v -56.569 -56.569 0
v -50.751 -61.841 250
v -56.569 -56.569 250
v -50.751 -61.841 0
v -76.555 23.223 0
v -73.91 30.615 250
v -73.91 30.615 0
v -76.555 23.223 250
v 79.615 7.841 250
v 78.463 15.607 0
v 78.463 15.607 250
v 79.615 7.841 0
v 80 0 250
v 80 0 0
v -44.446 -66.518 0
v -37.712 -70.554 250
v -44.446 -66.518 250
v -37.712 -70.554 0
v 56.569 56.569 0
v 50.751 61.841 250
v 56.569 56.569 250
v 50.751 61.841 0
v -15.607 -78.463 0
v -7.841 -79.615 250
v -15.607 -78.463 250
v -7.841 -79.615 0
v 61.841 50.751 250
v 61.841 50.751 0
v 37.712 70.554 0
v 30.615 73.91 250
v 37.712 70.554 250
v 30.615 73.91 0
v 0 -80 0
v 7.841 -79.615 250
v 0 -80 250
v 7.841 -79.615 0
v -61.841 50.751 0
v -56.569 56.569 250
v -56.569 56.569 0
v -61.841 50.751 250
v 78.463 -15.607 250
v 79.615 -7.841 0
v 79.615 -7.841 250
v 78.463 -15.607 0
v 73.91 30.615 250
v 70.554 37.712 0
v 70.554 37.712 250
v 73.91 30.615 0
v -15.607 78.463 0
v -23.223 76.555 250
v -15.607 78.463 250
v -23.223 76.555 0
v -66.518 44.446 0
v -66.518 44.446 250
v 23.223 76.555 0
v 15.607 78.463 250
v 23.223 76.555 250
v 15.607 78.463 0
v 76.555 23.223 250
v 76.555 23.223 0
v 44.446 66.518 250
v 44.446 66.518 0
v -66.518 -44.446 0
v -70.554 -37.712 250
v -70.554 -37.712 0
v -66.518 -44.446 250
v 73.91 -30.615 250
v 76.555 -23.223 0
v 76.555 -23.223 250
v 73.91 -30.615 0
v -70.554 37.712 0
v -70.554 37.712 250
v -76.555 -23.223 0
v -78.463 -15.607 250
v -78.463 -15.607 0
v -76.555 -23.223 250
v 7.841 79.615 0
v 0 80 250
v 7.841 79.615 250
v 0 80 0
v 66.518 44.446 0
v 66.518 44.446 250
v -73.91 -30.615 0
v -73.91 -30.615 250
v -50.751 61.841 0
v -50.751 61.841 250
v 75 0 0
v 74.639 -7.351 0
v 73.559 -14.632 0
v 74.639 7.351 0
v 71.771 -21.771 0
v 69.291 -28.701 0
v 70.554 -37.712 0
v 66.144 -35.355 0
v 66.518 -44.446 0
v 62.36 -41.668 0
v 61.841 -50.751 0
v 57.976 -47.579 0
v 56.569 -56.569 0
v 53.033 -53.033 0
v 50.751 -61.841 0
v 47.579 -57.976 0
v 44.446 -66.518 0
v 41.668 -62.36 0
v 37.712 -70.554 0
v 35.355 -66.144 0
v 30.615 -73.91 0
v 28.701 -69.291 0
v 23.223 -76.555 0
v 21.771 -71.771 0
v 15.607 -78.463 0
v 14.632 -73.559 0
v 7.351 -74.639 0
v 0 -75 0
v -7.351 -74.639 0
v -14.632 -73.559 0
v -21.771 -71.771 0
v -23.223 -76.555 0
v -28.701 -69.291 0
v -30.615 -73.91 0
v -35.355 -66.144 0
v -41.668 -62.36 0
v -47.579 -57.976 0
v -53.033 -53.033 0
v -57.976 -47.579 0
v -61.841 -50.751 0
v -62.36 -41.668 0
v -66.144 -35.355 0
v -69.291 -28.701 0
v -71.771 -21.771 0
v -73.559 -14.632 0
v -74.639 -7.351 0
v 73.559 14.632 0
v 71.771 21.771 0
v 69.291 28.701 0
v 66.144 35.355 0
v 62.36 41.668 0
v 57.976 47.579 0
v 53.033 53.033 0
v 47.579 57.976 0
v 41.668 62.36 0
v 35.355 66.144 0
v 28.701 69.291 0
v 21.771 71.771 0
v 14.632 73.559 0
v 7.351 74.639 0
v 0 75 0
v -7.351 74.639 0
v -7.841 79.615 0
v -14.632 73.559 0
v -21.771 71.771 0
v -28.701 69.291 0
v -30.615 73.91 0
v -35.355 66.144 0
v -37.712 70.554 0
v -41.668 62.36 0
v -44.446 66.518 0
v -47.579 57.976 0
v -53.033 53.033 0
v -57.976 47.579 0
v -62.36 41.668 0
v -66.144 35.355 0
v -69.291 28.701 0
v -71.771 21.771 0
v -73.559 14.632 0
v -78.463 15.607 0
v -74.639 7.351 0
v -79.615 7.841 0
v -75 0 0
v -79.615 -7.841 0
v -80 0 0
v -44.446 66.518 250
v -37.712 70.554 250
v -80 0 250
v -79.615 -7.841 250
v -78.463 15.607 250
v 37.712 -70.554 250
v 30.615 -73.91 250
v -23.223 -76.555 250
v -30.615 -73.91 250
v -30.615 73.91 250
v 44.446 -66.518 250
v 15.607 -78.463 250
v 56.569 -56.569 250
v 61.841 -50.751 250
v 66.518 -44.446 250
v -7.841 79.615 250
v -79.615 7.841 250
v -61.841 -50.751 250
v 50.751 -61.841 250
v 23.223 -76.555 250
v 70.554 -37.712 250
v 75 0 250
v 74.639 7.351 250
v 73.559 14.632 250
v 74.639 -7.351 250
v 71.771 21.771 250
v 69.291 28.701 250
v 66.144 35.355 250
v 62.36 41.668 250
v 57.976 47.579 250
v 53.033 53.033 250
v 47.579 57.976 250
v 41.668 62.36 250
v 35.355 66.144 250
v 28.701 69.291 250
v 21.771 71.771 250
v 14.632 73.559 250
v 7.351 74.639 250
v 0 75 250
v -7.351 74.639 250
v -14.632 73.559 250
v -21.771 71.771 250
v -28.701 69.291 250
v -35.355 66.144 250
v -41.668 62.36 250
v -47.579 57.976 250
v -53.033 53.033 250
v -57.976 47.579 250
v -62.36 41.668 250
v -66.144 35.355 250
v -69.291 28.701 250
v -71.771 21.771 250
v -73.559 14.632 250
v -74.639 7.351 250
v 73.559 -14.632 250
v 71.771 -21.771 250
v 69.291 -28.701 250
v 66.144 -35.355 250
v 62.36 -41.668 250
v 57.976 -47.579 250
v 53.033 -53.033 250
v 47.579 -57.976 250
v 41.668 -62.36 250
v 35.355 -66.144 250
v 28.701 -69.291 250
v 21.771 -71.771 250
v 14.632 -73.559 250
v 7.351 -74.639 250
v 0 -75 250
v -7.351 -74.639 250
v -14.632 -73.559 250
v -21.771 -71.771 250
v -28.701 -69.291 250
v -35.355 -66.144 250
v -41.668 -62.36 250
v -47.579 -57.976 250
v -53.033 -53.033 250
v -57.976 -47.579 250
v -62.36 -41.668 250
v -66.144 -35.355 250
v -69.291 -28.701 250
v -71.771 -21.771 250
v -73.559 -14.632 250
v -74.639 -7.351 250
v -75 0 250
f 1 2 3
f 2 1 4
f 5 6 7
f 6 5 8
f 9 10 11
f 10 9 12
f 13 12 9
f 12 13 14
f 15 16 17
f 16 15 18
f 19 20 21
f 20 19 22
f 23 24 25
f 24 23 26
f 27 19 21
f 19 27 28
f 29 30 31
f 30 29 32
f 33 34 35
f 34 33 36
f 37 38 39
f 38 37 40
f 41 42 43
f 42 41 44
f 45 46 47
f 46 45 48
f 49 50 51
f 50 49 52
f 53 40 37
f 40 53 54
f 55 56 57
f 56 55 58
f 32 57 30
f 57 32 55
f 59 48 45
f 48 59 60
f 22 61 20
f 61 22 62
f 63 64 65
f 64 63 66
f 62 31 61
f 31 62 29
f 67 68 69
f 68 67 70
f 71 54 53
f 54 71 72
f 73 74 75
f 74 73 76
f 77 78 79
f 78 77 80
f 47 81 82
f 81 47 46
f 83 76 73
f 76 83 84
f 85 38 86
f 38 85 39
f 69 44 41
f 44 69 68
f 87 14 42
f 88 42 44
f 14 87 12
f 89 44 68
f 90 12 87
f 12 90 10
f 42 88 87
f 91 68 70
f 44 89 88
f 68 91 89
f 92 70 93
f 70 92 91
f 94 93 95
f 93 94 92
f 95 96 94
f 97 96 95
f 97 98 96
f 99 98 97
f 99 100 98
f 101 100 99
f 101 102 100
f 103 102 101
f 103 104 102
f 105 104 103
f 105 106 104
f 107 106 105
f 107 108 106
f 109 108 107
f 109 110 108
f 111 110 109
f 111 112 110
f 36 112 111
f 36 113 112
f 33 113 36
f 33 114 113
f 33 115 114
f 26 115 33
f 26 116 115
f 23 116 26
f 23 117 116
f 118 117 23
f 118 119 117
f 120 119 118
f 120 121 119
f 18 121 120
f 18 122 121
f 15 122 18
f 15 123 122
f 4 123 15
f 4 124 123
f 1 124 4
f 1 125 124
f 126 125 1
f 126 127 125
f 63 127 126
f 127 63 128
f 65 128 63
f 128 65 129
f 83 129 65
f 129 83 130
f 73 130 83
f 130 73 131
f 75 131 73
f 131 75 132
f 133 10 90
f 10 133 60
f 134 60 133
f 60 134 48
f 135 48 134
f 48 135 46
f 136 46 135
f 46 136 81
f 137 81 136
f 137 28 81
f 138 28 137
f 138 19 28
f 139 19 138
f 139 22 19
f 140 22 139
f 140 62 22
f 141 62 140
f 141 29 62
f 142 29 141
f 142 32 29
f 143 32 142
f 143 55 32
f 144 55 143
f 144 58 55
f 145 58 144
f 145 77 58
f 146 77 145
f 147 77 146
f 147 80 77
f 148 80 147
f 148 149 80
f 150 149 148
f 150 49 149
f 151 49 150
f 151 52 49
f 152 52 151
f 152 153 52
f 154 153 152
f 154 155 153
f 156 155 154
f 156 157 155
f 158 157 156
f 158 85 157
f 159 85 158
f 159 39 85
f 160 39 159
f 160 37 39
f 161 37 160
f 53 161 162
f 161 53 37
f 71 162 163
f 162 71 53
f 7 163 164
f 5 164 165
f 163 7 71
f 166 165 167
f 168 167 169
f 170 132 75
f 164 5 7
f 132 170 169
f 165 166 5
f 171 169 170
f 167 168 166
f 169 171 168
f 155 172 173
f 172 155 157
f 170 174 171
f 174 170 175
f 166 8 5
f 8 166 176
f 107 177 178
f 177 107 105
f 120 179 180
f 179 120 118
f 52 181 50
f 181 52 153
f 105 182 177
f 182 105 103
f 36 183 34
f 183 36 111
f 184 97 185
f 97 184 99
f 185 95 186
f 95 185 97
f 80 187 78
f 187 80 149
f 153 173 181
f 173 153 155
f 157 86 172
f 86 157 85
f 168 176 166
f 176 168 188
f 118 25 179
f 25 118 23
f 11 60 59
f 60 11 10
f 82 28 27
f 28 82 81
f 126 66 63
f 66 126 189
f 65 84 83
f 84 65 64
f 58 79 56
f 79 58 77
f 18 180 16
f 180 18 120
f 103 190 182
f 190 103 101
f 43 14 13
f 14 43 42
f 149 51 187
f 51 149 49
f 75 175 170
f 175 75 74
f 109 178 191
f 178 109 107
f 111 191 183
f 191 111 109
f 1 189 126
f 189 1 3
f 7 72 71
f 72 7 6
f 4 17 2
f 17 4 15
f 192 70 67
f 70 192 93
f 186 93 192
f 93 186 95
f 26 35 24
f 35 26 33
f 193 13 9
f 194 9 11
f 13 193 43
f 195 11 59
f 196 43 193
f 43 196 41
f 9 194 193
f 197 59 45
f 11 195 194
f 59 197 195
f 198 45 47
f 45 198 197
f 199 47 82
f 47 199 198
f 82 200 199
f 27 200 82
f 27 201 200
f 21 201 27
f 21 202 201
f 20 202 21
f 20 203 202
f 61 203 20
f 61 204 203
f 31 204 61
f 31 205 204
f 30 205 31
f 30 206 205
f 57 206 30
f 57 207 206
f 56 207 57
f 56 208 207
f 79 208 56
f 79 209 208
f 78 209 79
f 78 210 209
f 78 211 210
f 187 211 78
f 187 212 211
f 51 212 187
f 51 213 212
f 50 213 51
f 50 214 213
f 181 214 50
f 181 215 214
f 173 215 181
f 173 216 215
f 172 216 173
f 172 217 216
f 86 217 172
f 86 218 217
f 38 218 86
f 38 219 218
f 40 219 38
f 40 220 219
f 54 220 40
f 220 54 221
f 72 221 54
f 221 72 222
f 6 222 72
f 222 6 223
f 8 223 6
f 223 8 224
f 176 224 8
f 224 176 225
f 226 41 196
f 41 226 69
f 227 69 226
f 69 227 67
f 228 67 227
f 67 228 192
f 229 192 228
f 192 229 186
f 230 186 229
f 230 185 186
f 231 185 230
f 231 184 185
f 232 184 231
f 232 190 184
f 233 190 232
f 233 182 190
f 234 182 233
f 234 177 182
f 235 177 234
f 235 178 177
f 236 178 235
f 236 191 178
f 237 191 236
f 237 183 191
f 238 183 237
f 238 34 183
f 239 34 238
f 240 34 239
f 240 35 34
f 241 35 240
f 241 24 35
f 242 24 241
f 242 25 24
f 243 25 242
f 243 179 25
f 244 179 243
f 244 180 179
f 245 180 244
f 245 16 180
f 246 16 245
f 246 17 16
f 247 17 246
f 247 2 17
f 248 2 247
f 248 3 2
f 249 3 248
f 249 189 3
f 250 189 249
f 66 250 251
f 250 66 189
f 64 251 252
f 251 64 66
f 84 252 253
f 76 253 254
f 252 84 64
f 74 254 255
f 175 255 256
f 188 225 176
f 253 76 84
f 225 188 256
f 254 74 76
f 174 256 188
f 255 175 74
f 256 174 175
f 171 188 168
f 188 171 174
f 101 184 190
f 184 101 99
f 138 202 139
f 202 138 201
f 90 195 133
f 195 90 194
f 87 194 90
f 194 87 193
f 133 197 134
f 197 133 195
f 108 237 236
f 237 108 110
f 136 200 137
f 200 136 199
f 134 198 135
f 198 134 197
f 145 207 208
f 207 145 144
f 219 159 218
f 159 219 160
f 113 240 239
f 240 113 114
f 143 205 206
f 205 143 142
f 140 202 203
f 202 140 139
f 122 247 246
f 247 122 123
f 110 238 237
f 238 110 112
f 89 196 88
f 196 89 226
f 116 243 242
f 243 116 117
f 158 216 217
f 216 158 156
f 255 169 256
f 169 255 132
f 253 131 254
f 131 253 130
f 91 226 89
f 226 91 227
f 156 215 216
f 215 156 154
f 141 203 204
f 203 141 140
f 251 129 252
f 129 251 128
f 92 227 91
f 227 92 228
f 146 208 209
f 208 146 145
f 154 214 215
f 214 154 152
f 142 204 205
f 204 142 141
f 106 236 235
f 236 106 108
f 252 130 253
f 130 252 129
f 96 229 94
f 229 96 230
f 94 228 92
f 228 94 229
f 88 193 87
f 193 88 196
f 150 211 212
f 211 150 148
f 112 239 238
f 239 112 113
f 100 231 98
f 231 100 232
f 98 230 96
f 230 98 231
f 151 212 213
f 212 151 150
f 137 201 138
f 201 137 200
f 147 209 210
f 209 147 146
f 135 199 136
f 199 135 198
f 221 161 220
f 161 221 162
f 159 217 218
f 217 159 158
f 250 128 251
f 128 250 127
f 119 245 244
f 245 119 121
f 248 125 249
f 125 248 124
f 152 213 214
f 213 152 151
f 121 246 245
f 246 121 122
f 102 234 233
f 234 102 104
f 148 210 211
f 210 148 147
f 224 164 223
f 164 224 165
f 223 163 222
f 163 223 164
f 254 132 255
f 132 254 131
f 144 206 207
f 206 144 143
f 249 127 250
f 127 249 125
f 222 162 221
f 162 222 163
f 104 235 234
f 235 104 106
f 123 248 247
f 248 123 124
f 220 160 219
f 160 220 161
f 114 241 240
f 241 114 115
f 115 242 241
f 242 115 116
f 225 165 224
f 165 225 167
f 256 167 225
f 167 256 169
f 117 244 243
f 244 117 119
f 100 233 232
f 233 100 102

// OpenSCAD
difference() {
    cylinder(h=250, d=160, $fn=64);
    translate([0, 0, -1])
        cylinder(h=252, d=150, $fn=64);
}
